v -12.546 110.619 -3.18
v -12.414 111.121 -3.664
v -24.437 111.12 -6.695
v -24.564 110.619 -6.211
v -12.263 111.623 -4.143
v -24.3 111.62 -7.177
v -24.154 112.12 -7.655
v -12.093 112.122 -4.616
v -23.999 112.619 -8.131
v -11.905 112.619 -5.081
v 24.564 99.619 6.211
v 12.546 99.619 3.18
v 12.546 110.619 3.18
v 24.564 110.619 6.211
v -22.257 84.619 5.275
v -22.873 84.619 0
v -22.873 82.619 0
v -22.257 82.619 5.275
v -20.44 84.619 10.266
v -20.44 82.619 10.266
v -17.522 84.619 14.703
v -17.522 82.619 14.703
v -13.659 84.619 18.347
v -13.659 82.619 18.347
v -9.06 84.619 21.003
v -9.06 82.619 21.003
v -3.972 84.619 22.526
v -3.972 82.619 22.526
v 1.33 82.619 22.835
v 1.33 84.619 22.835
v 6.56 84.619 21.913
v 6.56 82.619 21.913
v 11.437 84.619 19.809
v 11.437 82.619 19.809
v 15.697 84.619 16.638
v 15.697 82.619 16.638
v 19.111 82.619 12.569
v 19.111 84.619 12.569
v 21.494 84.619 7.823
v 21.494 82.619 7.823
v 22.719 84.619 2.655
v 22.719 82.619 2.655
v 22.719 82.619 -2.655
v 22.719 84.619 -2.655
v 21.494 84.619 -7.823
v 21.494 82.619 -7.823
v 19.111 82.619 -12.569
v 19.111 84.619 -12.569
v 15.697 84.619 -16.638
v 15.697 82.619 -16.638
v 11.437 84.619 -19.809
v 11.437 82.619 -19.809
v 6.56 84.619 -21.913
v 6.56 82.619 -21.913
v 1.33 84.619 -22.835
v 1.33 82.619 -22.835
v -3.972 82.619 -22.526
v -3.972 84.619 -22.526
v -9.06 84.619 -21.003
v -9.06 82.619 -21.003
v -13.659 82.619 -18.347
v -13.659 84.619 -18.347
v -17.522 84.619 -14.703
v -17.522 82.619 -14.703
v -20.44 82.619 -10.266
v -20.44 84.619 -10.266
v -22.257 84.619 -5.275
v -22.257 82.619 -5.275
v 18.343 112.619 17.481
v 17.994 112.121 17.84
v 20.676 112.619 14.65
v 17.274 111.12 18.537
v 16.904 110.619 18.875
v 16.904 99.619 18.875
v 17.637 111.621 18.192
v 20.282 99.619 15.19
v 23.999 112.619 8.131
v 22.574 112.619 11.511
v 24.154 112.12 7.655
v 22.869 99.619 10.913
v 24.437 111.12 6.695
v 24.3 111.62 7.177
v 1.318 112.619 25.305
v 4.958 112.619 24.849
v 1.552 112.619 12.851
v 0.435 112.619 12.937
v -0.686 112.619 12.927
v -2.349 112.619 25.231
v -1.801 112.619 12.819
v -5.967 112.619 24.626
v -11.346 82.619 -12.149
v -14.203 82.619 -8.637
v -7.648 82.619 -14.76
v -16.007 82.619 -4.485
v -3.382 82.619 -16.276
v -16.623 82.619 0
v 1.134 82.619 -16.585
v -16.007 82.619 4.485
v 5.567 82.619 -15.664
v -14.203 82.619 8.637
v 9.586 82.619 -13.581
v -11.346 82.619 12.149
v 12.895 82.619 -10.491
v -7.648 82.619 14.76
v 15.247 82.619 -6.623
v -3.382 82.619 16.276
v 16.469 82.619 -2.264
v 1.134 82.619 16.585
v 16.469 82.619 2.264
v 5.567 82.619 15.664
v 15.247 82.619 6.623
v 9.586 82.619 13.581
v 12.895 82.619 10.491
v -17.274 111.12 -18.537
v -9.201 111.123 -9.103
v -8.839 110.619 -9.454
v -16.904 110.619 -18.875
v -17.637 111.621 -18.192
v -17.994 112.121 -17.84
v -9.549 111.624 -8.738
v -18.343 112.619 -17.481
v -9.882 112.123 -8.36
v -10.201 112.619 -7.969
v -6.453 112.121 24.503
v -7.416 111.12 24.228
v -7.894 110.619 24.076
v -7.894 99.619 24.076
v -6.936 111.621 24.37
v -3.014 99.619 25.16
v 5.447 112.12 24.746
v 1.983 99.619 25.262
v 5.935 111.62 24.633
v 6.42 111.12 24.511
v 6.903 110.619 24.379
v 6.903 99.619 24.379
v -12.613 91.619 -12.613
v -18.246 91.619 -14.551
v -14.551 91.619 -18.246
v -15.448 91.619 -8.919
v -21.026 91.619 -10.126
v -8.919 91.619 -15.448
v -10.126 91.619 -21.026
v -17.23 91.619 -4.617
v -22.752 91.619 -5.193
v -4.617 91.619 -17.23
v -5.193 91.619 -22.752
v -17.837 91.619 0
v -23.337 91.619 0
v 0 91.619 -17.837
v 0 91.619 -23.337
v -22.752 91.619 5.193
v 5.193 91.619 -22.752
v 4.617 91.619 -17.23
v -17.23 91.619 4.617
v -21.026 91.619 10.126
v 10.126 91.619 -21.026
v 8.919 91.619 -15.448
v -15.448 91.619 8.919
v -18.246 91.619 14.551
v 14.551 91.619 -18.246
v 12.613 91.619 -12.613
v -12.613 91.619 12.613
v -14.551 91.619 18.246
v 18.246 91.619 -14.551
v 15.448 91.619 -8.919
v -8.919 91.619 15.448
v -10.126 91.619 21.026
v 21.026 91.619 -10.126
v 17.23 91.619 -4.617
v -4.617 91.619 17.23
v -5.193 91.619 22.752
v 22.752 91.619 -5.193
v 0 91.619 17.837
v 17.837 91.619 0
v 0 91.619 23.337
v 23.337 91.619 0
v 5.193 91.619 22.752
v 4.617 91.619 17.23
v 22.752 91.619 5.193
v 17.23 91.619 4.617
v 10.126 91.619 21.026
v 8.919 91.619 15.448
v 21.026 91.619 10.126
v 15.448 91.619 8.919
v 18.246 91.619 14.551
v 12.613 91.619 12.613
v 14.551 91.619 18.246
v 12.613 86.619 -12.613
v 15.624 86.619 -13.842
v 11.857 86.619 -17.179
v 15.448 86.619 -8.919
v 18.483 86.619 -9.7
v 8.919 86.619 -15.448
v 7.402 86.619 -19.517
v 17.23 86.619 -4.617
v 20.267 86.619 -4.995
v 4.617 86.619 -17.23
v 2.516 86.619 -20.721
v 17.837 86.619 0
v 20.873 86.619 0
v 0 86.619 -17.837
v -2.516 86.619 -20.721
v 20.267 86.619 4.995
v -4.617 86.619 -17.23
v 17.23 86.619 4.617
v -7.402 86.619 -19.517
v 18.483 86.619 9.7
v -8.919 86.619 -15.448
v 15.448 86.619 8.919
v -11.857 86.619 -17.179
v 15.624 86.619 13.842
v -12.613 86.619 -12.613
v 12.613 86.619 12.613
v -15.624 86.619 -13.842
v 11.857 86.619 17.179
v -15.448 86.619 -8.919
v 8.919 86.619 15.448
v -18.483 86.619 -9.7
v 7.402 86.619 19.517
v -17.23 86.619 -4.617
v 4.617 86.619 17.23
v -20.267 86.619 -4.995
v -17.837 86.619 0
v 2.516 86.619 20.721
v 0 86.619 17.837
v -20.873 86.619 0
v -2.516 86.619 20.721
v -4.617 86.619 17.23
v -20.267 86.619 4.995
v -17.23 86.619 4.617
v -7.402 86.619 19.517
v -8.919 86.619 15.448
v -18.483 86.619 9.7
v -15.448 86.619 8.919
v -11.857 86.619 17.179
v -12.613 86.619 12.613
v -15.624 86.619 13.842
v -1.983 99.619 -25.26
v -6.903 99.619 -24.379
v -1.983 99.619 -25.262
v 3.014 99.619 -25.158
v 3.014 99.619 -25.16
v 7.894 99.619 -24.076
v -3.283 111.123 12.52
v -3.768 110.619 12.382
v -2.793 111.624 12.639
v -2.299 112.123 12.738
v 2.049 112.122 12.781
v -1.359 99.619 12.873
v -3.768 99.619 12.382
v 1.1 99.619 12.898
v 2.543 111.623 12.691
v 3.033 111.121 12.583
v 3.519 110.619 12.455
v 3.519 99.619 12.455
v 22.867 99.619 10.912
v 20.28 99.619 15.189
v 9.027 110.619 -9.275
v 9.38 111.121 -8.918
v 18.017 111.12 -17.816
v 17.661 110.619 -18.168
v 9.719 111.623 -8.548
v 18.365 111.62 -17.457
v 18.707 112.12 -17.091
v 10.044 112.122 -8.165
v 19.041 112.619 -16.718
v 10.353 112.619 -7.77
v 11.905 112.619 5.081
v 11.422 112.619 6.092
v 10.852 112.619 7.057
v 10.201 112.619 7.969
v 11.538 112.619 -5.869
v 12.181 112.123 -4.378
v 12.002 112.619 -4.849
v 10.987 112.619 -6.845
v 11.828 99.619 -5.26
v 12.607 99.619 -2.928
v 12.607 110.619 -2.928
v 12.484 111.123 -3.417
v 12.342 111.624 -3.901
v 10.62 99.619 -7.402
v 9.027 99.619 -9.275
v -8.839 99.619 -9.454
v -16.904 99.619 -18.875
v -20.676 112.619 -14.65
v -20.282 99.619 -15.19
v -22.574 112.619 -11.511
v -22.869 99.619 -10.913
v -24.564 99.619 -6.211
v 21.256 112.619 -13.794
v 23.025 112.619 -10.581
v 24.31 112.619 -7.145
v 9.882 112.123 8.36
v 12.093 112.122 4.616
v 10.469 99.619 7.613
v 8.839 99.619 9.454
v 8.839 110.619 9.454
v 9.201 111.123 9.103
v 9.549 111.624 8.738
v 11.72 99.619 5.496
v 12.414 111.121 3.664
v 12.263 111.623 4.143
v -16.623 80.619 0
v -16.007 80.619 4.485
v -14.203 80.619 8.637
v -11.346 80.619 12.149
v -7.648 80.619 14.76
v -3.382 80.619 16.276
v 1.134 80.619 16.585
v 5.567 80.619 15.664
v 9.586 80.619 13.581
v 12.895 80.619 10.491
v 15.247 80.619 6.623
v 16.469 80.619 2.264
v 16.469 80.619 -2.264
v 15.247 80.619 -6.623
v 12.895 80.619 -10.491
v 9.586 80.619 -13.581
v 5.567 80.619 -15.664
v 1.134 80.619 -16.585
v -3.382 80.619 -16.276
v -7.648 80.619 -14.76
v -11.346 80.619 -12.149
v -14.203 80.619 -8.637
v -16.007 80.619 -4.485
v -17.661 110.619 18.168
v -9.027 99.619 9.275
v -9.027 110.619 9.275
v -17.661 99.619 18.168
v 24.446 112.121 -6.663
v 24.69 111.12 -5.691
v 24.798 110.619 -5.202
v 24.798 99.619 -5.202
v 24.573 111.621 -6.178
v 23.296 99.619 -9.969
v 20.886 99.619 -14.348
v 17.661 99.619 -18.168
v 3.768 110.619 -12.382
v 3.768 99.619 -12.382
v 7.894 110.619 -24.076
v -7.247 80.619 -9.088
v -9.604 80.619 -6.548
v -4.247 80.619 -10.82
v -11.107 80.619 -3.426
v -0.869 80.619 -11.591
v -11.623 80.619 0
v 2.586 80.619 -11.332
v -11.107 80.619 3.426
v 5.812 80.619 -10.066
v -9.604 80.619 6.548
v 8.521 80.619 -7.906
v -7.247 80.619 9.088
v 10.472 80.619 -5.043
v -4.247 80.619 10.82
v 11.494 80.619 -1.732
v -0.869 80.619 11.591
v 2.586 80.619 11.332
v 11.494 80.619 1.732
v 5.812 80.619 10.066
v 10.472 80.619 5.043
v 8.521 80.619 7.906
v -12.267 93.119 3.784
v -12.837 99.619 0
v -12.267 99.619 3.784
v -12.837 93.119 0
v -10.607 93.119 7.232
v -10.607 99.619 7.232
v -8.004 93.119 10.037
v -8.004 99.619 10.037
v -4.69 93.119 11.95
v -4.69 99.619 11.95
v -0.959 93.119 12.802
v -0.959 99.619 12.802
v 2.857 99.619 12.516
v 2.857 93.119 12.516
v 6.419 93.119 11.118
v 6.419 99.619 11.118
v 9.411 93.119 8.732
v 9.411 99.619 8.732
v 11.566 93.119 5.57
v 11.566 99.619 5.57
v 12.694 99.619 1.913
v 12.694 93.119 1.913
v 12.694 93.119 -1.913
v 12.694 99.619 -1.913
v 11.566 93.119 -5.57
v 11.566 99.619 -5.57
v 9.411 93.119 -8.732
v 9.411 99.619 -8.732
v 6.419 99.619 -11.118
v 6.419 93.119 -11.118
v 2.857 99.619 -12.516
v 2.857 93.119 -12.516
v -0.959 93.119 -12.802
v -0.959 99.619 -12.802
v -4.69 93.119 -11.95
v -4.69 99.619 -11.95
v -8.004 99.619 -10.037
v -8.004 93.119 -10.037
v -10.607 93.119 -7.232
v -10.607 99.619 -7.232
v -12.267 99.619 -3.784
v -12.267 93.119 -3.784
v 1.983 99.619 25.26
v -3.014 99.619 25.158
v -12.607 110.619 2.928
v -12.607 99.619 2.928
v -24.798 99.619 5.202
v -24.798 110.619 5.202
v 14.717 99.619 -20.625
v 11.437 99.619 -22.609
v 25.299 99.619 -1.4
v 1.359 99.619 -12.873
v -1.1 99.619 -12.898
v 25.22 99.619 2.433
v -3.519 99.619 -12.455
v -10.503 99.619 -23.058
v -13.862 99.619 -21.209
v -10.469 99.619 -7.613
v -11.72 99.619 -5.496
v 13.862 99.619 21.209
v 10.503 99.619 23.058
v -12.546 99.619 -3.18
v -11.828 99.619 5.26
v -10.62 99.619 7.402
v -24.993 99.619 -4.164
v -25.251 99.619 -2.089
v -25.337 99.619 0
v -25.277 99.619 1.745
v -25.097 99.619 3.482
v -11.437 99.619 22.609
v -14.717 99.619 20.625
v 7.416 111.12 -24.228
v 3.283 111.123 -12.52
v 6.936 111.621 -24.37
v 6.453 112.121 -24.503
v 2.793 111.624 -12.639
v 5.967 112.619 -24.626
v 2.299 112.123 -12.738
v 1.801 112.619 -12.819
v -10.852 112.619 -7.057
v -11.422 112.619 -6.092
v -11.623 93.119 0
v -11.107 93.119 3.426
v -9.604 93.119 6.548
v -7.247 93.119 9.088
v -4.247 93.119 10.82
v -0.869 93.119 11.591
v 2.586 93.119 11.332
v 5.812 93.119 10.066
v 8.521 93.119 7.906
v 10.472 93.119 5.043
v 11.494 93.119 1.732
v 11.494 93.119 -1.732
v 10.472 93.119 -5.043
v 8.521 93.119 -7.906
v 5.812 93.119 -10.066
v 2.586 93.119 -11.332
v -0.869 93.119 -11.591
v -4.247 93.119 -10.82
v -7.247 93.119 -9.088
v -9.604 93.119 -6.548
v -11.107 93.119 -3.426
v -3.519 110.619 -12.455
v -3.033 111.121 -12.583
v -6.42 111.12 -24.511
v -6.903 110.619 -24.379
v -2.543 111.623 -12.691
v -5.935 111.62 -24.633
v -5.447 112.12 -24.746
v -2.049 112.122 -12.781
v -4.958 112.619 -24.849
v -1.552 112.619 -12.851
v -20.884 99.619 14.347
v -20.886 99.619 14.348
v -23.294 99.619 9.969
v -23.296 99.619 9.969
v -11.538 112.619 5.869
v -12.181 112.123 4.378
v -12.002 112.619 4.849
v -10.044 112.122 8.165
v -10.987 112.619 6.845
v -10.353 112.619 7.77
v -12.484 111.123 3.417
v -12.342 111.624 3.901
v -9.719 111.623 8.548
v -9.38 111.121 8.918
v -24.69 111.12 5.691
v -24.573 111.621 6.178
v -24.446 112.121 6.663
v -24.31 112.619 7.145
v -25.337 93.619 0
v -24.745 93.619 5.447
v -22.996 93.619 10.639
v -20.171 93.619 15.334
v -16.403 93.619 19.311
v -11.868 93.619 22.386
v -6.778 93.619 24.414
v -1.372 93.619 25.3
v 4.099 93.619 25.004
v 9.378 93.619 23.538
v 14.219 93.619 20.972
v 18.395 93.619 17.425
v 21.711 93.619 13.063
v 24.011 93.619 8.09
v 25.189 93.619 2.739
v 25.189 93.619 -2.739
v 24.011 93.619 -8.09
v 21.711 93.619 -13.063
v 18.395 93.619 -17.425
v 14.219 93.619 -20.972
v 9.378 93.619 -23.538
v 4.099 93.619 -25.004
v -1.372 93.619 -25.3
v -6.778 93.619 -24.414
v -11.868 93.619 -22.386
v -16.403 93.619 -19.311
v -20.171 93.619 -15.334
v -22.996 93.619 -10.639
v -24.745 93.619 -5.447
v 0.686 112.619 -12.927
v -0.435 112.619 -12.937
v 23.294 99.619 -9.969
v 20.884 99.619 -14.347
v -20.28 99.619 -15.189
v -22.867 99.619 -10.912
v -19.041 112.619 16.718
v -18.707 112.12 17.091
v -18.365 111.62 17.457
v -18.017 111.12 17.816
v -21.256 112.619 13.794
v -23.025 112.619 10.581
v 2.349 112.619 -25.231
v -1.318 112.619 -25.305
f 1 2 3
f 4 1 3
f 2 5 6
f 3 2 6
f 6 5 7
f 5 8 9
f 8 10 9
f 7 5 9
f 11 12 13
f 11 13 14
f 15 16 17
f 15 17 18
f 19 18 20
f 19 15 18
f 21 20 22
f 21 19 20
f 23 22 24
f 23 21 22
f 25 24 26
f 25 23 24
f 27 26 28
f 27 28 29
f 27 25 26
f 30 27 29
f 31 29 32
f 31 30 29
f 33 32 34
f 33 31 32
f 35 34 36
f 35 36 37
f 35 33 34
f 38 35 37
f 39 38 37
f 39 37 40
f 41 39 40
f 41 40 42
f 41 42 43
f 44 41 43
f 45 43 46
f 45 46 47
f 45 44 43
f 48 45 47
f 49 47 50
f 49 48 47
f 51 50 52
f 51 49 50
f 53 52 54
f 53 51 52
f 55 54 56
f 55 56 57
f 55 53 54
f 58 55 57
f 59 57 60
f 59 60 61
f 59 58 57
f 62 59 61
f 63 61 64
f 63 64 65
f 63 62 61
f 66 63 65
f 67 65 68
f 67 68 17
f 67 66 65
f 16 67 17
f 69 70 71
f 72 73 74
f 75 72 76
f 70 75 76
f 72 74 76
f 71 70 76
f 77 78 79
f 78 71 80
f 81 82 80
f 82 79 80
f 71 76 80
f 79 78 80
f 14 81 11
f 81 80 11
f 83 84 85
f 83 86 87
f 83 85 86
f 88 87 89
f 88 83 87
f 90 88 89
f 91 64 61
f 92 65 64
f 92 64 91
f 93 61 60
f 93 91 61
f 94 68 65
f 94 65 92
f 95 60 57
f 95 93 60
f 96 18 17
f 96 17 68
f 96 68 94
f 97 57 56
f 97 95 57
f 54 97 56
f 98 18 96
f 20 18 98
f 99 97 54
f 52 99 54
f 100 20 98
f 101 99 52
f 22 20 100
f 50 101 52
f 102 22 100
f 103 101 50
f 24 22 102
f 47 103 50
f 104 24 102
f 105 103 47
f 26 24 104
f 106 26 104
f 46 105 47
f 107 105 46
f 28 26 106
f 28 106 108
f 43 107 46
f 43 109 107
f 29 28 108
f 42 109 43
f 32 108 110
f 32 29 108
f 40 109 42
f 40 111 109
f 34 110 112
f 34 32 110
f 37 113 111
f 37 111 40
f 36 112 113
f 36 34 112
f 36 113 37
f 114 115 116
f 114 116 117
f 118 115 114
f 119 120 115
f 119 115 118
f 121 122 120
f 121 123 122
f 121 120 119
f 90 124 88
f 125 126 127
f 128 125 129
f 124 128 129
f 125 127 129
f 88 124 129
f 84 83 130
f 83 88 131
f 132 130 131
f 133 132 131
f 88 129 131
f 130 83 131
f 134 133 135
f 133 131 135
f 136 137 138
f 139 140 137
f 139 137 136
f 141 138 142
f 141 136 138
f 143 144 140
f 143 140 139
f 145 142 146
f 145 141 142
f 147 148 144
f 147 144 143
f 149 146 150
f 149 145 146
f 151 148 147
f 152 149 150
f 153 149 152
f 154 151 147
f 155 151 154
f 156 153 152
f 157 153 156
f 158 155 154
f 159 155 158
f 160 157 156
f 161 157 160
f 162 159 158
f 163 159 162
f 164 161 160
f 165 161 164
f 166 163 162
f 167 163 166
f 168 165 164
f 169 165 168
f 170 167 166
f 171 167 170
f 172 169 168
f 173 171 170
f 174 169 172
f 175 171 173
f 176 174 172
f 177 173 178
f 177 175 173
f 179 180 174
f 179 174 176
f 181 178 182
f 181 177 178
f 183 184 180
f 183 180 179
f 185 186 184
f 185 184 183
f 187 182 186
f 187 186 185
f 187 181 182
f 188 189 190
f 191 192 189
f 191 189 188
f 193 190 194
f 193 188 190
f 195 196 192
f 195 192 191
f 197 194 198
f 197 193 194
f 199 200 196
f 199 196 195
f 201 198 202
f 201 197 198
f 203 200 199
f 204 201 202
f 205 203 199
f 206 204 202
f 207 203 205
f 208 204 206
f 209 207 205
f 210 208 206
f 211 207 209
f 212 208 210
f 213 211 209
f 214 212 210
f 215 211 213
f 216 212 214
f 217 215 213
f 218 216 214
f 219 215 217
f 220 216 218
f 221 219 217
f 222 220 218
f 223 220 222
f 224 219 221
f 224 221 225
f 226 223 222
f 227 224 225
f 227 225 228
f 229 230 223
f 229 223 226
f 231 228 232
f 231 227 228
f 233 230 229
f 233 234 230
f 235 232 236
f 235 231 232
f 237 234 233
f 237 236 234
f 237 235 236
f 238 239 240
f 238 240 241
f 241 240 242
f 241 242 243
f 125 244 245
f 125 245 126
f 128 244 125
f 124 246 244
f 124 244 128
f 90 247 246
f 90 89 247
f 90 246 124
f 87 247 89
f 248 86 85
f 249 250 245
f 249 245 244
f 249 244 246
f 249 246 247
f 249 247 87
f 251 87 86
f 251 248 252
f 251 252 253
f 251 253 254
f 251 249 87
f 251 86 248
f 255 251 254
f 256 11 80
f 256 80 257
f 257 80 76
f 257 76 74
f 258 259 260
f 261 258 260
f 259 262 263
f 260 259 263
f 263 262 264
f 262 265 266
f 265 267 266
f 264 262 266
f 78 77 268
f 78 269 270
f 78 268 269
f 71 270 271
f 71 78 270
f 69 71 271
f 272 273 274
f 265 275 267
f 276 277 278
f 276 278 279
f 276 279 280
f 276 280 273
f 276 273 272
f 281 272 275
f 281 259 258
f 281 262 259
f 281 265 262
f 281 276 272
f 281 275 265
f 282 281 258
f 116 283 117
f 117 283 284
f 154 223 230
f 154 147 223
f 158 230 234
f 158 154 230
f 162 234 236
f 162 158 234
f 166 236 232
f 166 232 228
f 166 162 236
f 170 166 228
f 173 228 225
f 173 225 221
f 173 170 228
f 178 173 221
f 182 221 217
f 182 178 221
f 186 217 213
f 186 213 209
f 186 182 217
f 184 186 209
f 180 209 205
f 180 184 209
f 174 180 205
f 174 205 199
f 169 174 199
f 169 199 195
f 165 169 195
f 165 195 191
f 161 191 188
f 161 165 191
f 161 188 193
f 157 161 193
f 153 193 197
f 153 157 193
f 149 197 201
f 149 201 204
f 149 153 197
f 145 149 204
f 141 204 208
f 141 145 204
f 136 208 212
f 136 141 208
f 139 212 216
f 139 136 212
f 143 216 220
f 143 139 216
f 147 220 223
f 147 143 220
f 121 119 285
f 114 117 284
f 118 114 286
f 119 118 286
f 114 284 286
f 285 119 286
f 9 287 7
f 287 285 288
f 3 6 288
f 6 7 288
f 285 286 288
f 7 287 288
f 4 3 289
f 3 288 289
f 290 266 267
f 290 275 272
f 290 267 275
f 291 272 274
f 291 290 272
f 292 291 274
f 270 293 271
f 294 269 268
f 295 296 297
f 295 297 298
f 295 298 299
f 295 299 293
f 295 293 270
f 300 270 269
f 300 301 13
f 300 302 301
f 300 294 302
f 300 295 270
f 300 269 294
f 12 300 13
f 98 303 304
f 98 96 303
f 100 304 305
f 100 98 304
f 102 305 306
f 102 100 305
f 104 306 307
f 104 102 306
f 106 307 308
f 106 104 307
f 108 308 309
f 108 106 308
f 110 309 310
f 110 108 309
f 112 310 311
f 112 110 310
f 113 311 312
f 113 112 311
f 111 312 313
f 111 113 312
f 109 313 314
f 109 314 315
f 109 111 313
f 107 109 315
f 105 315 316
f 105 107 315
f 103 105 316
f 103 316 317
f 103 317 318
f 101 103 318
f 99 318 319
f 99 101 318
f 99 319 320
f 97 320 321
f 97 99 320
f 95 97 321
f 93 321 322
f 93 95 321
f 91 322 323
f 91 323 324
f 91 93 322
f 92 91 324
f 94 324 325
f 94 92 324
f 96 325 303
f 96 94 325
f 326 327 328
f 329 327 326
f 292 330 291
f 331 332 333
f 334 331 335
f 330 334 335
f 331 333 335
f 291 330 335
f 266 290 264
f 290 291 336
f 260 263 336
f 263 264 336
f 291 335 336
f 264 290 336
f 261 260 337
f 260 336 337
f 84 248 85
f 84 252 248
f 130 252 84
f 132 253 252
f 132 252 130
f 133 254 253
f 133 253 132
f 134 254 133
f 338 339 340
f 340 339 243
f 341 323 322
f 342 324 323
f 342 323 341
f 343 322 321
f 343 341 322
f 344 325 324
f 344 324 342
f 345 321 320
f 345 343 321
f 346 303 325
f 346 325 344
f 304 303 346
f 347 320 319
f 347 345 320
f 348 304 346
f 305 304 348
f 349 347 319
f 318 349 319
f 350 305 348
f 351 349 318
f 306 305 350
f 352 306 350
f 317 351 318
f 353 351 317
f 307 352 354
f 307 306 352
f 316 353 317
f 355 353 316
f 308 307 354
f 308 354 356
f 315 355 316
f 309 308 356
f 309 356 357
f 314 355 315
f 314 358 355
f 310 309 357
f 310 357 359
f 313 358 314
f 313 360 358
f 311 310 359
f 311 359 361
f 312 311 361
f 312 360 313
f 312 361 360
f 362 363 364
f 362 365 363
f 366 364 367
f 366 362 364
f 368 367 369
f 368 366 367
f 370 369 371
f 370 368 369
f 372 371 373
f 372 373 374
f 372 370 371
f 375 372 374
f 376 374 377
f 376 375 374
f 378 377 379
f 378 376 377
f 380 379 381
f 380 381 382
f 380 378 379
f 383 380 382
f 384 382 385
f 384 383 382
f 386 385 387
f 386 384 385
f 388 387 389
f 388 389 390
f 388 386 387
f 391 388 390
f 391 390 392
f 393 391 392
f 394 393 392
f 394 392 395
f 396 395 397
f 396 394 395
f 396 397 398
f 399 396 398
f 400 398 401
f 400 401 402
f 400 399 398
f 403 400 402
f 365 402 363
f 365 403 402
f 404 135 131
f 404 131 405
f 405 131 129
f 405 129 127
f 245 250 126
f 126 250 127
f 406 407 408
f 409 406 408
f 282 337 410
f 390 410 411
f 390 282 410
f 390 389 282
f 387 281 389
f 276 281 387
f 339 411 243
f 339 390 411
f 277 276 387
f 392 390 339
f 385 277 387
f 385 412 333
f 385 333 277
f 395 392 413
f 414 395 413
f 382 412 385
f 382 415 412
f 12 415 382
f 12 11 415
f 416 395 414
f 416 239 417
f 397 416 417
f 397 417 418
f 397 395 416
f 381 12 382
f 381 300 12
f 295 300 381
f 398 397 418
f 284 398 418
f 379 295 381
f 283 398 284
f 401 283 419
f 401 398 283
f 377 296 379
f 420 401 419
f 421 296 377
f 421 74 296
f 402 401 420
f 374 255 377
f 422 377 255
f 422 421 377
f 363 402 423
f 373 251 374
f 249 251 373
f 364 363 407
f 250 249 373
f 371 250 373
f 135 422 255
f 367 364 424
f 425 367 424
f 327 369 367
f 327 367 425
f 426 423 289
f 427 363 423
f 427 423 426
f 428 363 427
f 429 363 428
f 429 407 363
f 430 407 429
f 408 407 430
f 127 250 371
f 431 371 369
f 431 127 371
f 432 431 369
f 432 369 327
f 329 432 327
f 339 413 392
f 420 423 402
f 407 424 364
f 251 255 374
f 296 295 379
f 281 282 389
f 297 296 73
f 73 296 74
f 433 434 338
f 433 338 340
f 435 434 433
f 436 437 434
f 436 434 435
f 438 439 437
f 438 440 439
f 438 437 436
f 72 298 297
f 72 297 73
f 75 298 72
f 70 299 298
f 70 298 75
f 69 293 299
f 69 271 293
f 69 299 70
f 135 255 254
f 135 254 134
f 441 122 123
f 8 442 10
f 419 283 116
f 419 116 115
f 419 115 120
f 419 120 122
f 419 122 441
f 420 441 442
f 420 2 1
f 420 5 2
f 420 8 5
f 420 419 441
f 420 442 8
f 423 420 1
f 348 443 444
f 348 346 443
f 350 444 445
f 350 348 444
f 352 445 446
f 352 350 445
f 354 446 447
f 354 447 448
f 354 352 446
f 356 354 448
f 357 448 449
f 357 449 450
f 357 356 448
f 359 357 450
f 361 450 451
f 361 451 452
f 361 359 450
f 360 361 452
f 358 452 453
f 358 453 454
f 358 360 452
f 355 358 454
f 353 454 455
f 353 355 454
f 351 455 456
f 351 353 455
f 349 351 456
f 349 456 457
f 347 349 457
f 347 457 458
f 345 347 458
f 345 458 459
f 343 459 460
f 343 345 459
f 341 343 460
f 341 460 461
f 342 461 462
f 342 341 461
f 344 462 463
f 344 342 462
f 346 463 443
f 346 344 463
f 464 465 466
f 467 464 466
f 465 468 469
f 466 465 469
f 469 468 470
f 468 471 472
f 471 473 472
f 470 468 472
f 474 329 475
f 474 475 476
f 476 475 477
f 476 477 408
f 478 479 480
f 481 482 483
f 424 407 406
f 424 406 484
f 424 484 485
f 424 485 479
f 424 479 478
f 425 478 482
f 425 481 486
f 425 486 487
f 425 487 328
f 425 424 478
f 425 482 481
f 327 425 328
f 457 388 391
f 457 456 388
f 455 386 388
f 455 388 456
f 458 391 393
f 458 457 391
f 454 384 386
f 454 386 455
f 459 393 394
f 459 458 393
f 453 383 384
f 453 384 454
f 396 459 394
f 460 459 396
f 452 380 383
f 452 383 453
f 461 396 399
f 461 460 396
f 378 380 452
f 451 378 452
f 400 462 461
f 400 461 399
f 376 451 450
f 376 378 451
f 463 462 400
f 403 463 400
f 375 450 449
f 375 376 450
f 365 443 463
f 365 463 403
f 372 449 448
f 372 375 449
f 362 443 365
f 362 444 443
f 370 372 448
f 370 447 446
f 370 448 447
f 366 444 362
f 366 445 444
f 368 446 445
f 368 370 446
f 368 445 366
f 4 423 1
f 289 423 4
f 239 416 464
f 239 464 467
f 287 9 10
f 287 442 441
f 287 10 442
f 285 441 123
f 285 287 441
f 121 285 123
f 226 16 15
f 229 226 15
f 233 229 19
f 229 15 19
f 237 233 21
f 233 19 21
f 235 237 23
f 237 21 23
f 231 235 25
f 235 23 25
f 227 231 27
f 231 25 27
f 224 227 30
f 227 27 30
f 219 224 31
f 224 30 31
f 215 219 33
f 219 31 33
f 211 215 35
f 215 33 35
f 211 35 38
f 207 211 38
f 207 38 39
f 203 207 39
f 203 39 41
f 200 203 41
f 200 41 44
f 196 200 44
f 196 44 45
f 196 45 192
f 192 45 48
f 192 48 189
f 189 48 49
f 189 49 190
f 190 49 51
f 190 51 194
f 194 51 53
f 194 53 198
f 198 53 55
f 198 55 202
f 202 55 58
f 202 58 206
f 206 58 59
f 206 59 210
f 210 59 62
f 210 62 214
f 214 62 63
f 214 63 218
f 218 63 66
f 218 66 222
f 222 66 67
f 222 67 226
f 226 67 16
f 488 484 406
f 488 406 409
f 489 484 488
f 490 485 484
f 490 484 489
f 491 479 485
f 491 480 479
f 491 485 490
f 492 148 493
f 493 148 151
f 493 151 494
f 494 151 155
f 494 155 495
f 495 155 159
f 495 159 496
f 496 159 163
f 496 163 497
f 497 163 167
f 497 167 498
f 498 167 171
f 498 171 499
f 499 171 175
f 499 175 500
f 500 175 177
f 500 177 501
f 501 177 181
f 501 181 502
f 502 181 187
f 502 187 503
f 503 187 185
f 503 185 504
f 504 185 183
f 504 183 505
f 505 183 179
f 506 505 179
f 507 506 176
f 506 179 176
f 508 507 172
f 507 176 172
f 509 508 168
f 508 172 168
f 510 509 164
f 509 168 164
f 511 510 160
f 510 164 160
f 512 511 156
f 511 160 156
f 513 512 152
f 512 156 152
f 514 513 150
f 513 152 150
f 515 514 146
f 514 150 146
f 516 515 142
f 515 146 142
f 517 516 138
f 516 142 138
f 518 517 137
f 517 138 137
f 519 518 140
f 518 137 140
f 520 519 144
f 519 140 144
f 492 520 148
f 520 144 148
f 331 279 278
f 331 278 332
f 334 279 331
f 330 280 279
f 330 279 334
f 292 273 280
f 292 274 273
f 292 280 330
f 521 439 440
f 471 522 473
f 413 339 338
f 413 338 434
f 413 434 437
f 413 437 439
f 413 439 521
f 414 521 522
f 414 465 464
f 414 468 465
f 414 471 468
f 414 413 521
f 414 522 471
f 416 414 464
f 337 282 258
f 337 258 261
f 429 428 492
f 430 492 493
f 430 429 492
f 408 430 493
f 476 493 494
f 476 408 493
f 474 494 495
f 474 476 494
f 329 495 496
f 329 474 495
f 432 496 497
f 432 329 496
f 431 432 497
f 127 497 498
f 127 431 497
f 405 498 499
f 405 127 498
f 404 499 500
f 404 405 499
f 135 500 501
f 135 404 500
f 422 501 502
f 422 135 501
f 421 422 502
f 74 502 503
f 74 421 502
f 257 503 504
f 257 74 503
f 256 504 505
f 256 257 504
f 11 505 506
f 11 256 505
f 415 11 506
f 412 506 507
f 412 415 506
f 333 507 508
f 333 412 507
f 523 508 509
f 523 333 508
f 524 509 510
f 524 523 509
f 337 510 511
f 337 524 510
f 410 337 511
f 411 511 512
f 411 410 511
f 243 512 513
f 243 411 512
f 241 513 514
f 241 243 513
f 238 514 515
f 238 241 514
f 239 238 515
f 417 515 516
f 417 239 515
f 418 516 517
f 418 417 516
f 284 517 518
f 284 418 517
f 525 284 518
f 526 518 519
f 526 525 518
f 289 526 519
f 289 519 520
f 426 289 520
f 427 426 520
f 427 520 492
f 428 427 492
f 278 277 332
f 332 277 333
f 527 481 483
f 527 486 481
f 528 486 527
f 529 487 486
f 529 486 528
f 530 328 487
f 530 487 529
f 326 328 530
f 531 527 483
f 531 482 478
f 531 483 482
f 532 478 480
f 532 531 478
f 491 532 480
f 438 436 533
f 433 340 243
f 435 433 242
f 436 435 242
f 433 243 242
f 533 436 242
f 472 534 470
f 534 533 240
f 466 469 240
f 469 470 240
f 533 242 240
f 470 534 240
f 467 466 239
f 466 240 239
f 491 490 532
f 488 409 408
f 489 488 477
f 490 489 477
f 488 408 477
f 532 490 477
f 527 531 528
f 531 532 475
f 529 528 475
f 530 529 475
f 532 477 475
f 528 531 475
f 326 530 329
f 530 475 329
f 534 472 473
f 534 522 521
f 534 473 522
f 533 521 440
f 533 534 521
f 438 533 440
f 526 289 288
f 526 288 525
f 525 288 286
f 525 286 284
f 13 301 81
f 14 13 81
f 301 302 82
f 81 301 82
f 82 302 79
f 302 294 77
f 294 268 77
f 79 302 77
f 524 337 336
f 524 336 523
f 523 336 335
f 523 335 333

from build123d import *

# Parameters (mm, degrees)
PAD_DEPTH          = 13
CHAMFER_SIZE       = 2
POLARPATTERN_COUNT = 6
CHAMFER001_SIZE    = 2
CHAMFER002_SIZE    = 2


with BuildPart() as part:
    # Sketch → Revolution (revolve)
    with BuildSketch(Plane.XY):
        Polygon((-11.623481, 80.619493), (-16.623481, 80.619493), (-16.623481, 82.619493), (-22.873481, 82.619493), (-22.873481, 86.619493), (-17.837431, 86.619493), (-17.837431, 91.619493), (-25.337431, 91.619493), (-25.337431, 99.619493), (-12.837431, 99.619493), (-12.837431, 93.119493), (-11.623481, 93.119493), align=None)
    revolve(axis=Axis((0, 0, 0), (0, 1, 0)))

    # Sketch002 (on Face9 of Revolution) → Pad (new body)
    with BuildSketch(Plane(origin=(0, 99.619493, 0), x_dir=(-1, 0, 0), z_dir=(0, 1, 0))):
        with BuildLine():
            Line((3.768044, 12.382216), (7.894003, 24.07634))
            ThreePointArc((7.894003, 24.07634), (0.517974, 25.334484), (-6.903315, 24.378877))
            Line((-3.51886, 12.454993), (-6.903315, 24.378877))
            ThreePointArc((3.768044, 12.382216), (0.129841, 12.944225), (-3.51886, 12.454993))
        make_face()
    pad = extrude(amount=PAD_DEPTH)

    # Chamfer
    chamfer_edges = [part.edges().sort_by_distance(p)[0] for p in [
        (-5.831023, 112.619493, 18.229278),
        (5.211088, 112.619493, 18.416935),
    ]]
    chamfer(chamfer_edges, length=CHAMFER_SIZE)

    # PolarPattern: Pad ×6 about axis
    polarpattern_axis = Axis((0, 99.619493, 0), (0, 1, 0))
    for i in range(1, POLARPATTERN_COUNT):
        add(pad.rotate(polarpattern_axis, i * 360 / POLARPATTERN_COUNT))

    # Chamfer001
    chamfer001_edges = [part.edges().sort_by_distance(p)[0] for p in [
        (18.555078, 112.619493, 4.695533),
        (12.871506, 112.619493, 14.164453),
        (18.702529, 112.619493, -4.064825),
        (13.34399, 112.619493, -13.721402),
        (5.831023, 112.619493, -18.229278),
        (-5.211088, 112.619493, -18.416935),
        (-12.871506, 112.619493, -14.164453),
        (-18.555078, 112.619493, -4.695533),
        (-18.702529, 112.619493, 4.064825),
        (-13.34399, 112.619493, 13.721402),
    ]]
    chamfer(chamfer001_edges, length=CHAMFER001_SIZE)

    # Chamfer002
    chamfer002_edges = [part.edges().sort_by_distance(p)[0] for p in [
        (25.337431, 91.619493, 0),
        (22.873481, 86.619493, 0),
    ]]
    chamfer(chamfer002_edges, length=CHAMFER002_SIZE)


solid = part.part
